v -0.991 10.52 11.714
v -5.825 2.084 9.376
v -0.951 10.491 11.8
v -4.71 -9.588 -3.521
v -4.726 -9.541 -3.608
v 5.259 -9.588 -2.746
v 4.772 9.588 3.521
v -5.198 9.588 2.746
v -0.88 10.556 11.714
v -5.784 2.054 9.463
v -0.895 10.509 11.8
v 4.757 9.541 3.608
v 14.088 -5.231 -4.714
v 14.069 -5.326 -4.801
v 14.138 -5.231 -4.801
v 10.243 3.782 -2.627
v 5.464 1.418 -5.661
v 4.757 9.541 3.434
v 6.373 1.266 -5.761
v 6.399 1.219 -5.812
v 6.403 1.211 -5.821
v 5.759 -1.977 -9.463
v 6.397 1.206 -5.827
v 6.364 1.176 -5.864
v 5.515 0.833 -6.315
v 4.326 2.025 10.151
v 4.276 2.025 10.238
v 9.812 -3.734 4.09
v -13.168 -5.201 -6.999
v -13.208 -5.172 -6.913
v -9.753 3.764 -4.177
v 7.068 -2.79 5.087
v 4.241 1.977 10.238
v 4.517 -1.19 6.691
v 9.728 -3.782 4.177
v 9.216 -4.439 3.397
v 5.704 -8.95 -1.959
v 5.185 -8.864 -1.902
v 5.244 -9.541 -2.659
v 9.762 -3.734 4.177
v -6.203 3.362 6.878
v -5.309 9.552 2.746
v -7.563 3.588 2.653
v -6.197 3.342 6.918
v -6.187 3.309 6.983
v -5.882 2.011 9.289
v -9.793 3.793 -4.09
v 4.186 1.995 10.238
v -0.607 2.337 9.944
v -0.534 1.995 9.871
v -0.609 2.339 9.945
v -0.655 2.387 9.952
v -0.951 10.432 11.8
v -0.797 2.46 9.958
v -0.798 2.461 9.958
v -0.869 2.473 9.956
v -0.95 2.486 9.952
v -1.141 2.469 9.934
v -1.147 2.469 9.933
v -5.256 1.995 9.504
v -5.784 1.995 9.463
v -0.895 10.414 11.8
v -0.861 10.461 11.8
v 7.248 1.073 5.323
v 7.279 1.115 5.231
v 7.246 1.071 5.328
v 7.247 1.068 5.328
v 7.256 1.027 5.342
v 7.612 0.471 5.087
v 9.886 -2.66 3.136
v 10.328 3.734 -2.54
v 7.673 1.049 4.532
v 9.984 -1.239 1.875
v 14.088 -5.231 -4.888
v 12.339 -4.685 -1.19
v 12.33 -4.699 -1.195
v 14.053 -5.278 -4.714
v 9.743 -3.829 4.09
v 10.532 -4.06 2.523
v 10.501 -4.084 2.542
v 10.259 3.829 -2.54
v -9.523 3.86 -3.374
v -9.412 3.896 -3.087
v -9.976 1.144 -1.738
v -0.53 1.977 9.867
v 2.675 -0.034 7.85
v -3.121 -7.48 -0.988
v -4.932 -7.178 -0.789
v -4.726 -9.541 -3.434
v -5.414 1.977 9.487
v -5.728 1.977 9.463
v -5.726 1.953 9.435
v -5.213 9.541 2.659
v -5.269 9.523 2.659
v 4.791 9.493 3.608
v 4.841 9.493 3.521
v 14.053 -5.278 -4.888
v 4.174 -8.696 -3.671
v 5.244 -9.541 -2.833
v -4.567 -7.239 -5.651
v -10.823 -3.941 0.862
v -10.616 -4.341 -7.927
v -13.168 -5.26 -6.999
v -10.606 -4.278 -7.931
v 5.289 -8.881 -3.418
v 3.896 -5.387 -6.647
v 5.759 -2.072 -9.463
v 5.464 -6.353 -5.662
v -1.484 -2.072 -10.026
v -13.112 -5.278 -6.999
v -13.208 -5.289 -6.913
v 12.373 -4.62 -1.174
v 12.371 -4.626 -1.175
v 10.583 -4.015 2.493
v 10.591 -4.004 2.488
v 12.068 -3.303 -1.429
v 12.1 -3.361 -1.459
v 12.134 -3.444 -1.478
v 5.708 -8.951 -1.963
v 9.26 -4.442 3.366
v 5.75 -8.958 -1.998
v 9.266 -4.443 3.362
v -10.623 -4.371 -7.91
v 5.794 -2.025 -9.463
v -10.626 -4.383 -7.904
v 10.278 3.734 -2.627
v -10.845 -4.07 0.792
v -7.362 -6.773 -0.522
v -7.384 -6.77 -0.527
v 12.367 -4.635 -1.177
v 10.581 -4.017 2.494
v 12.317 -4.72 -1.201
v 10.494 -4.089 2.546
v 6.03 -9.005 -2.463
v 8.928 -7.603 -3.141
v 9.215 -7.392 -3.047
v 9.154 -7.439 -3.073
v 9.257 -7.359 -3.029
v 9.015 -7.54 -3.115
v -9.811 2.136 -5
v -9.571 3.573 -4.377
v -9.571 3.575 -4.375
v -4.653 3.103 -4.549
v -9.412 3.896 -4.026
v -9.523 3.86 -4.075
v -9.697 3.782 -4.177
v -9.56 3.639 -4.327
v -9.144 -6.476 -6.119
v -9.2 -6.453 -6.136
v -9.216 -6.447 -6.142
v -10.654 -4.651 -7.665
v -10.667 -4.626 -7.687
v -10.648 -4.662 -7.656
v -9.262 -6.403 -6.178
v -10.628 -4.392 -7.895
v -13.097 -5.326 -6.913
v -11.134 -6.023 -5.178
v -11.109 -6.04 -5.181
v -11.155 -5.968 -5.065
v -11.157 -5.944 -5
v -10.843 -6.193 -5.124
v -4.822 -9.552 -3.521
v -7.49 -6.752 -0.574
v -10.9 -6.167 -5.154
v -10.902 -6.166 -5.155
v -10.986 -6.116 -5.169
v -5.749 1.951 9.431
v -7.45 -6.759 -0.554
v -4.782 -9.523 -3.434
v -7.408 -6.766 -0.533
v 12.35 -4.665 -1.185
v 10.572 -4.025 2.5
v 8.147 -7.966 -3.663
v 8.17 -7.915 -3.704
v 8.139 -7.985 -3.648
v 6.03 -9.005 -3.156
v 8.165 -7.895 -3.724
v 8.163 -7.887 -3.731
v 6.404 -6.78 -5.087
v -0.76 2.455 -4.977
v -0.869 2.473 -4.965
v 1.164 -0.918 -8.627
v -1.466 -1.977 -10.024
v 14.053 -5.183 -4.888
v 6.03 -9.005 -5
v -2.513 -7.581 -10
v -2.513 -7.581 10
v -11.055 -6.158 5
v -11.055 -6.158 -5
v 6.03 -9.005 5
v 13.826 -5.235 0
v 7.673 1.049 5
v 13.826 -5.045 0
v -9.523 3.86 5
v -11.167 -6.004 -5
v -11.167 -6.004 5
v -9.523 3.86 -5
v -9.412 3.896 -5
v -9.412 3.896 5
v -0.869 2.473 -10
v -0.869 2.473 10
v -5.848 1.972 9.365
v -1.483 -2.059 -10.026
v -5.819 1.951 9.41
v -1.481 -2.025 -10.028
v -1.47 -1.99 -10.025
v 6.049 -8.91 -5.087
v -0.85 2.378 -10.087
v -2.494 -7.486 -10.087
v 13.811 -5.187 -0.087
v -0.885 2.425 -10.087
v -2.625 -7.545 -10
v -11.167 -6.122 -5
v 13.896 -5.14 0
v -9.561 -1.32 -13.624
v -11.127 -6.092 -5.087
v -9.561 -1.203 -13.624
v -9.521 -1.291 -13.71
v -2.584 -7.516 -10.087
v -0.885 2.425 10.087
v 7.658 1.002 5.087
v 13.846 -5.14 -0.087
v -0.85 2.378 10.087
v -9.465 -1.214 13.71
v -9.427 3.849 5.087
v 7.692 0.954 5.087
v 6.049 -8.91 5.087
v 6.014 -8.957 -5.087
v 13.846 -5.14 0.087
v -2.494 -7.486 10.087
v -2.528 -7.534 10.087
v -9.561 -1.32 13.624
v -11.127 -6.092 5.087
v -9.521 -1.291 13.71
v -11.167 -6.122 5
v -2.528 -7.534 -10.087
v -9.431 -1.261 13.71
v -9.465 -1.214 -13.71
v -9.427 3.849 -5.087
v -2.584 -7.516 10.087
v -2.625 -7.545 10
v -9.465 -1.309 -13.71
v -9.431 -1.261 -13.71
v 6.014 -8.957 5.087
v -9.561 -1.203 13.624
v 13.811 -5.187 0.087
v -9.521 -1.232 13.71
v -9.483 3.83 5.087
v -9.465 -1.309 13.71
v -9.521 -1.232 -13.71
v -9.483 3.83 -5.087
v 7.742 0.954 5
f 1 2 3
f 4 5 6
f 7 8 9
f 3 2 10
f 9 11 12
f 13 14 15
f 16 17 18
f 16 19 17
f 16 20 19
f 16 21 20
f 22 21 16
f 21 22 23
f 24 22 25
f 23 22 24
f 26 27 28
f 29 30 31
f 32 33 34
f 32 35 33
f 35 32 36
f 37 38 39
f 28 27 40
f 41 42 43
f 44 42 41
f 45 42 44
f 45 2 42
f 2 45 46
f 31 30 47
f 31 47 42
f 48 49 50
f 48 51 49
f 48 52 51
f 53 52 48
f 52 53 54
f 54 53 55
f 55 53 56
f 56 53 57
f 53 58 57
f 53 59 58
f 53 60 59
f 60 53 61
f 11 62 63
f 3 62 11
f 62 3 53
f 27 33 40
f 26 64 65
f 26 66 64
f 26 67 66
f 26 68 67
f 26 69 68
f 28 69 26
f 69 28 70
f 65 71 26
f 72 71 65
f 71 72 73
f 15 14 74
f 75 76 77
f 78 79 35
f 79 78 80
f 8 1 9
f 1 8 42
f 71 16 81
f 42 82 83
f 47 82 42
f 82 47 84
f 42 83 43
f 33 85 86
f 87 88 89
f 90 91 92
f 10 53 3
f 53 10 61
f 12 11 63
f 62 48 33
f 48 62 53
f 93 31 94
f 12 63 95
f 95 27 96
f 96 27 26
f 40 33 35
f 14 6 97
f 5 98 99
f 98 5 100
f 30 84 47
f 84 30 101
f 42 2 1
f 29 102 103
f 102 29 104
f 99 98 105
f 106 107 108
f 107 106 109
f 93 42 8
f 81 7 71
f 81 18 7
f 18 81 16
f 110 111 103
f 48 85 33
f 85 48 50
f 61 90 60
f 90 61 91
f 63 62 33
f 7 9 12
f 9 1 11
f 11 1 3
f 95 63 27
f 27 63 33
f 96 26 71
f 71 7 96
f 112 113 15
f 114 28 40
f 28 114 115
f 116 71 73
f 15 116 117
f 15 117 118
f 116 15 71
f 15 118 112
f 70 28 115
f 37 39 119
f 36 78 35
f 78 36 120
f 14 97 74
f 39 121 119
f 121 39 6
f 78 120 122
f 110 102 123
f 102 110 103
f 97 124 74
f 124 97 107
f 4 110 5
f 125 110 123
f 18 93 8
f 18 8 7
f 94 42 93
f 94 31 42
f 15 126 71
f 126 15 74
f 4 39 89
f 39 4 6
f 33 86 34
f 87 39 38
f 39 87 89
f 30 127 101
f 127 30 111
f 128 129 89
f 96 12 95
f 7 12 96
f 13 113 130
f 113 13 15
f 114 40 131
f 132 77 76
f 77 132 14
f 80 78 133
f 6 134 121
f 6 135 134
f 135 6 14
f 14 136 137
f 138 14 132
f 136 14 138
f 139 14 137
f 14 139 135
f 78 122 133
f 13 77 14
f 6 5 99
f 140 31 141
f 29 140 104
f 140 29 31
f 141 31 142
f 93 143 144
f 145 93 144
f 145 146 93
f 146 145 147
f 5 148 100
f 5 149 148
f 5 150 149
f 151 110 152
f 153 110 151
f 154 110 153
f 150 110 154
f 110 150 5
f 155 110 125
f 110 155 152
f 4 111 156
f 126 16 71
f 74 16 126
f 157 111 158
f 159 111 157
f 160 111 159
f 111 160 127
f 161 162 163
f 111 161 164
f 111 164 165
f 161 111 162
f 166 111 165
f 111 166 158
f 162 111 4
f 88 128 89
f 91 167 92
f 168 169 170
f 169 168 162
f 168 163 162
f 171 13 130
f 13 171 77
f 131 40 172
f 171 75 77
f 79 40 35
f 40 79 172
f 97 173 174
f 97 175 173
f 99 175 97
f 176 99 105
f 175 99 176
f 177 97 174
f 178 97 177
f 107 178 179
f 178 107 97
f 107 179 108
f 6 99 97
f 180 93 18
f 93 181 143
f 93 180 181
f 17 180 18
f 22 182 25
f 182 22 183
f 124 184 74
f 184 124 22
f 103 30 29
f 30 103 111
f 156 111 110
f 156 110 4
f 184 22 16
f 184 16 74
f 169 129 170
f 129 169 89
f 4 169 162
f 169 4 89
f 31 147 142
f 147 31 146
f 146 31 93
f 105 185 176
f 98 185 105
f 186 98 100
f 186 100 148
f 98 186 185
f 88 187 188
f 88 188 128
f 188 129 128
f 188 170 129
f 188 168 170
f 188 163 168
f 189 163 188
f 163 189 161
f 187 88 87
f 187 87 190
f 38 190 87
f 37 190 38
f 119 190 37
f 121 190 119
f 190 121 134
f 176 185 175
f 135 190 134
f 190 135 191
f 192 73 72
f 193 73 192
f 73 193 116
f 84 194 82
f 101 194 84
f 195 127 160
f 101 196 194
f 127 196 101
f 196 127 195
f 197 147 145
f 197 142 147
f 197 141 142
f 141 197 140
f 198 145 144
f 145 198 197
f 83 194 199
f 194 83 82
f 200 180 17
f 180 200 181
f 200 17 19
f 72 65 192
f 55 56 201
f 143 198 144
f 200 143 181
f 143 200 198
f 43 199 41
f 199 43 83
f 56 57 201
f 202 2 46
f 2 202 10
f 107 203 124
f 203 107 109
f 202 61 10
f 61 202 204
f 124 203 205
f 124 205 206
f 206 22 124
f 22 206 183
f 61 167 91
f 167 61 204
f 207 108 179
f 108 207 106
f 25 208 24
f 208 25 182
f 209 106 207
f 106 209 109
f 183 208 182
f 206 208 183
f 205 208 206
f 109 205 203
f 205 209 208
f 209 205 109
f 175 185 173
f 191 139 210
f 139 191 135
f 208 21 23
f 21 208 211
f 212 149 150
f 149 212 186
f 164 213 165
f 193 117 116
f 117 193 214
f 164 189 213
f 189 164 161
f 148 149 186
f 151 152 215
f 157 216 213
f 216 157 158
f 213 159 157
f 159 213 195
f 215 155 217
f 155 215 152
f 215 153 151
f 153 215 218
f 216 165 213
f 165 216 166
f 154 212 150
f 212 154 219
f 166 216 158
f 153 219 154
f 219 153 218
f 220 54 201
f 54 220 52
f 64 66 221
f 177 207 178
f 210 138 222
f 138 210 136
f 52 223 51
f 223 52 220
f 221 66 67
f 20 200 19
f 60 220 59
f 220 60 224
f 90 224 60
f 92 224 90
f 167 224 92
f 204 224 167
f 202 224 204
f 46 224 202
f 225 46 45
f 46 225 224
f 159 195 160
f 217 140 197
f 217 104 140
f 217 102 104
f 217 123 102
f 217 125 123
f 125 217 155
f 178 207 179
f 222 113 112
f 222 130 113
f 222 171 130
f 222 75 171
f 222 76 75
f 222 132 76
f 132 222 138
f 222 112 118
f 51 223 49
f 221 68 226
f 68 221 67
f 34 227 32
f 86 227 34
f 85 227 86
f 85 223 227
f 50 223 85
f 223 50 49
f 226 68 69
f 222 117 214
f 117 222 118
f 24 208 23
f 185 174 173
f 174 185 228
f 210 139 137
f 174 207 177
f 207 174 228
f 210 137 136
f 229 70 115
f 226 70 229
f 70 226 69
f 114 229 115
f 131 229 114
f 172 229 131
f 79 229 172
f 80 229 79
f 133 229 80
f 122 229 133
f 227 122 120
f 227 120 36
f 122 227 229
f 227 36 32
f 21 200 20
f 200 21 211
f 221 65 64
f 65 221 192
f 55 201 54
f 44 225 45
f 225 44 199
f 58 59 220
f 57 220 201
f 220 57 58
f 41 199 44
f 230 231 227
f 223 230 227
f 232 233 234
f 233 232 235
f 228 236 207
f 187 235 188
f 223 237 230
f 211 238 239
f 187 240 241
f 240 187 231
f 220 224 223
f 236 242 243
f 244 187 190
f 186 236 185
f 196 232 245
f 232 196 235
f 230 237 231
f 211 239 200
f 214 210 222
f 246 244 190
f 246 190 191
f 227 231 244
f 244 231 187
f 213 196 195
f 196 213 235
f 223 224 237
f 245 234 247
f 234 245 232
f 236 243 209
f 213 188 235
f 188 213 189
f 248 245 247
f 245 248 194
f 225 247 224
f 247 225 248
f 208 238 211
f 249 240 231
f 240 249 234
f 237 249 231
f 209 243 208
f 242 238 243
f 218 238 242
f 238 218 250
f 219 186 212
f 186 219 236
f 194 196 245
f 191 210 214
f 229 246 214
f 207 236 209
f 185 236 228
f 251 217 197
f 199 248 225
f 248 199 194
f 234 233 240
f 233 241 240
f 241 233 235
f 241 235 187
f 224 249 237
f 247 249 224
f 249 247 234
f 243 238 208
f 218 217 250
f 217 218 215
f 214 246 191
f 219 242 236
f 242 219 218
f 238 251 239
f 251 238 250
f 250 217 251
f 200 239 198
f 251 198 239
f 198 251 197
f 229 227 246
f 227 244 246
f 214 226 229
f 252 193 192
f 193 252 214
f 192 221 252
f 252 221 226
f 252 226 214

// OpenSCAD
// Auto-generated OpenSCAD file

    inner_points = 10*[[0.599886064142325, -0.8909680205958462, -0.5000000000000165], [0.7642449049774599, 0.095432593474994, -0.500000000000021], [-1.1086099160454883, -0.6062901575962651, 0.500000000000021], [-0.9442510752103533, 0.3801104564745751, 0.5000000000000165], [0.599886064142347, -0.8909680205958453, 0.4999999999999834], [0.764244904977482, 0.09543259347499483, 0.49999999999997896], [-0.2543619259516038, -0.7486290890960565, -0.9999999999999978], [-0.09000308511646875, 0.23777152497478365, -1.0000000000000022], [-0.2543619259515596, -0.7486290890960547, 1.0000000000000022], [-0.09000308511642456, 0.23777152497478538, 0.9999999999999978], [-1.1086099160455103, -0.606290157596266, -0.49999999999997896], [-0.9442510752103753, 0.3801104564745742, -0.4999999999999834], [1.3795560477359692, -0.51398696446291, -3.397282455352979e-14], [-0.9480517821689757, -0.12614969085949718, 1.3623724356958116], [-0.948051782169036, -0.12614969085949948, -1.3623724356957776]];

    outer_points = 10*[[-1.0227603980993214, -0.3734255004598836, 0.25399717259450516], [-0.9712245325180885, 0.3734255004598836, -0.40899425795639943], [0.9712245325180885, -0.3734255004598836, 0.40899425795639943], [1.0227603980993214, 0.3734255004598836, -0.25399717259450516], [-0.47413873270521345, -0.9493249594098434, -0.3521002465068624], [-0.4226028671239805, -0.20247395849007616, -1.0150916770577671], [-0.5743895981847245, 0.20247395849007616, 0.9375931343768199], [-0.5228537326034916, 0.9493249594098434, 0.27460170382591526], [0.5228537326034916, -0.9493249594098434, -0.27460170382591526], [0.5743895981847245, -0.20247395849007616, -0.9375931343768199], [0.4226028671239805, 0.20247395849007616, 1.0150916770577671], [0.47413873270521345, 0.9493249594098434, 0.3521002465068624], [-1.312748714738331, -0.5230596990703646, -0.6912627825601987], [1.4038013919276195, -0.5230596990703646, -0.4800990258499658], [-0.09105267718928864, 1.0461193981407293, 1.1713618084101645]];

    // Convex hull for inner set (I)
    module inner_hull() {
        hull() {
            for (p = inner_points) {
                translate(p) sphere(r=0.1);
            }
        }
    }

    // Convex hull for outer set (O) minus inner hull (O \ I)
    module outer_minus_inner() {
        difference() {
            hull() {
                for (p = outer_points) {
                    translate(p) sphere(r=0.1);
                }
            }
            inner_hull(); // Subtract inner hull
        }
    }

    // Convex hull for outer set (O) minus all translated inner hulls
    module outer_minus_AllTranslationInner() {
        difference() {
            hull() {
                for (p = outer_points) {
                    translate(p) sphere(r=0.1);
                }
            }
            hull() {
                translate([0,0,50]) inner_hull();
                translate([0,0,-50]) inner_hull();
            }; // Subtract translated inner hulls
        }
    }

    // Difference between outer_minus_inner and outer_minus_AllTranslationInner
    module outer_minus_inner_diff() {
        difference() {
            // Outer minus inner
            difference() {
                hull() {
                    for (p = outer_points) {
                        translate(p) sphere(r=0.1);
                    }
                }
                inner_hull();
            }

            // Subtract Outer minus AllTranslationInner
            difference() {
                hull() {
                    for (p = outer_points) {
                        translate(p) sphere(r=0.1);
                    }
                }
                hull() {
                    translate([0,0,50]) inner_hull();
                    translate([0,0,-50]) inner_hull();
                };
            }
        }
    }

    // Rendering all with colors applied
    color([1, 0, 0, 0.5]) inner_hull(); // Transparent red
    color([0, 1, 0, 1]) outer_minus_AllTranslationInner(); // Opaque green
    color([1, 1, 0, 1]) outer_minus_inner_diff(); // Opaque yellow
    
